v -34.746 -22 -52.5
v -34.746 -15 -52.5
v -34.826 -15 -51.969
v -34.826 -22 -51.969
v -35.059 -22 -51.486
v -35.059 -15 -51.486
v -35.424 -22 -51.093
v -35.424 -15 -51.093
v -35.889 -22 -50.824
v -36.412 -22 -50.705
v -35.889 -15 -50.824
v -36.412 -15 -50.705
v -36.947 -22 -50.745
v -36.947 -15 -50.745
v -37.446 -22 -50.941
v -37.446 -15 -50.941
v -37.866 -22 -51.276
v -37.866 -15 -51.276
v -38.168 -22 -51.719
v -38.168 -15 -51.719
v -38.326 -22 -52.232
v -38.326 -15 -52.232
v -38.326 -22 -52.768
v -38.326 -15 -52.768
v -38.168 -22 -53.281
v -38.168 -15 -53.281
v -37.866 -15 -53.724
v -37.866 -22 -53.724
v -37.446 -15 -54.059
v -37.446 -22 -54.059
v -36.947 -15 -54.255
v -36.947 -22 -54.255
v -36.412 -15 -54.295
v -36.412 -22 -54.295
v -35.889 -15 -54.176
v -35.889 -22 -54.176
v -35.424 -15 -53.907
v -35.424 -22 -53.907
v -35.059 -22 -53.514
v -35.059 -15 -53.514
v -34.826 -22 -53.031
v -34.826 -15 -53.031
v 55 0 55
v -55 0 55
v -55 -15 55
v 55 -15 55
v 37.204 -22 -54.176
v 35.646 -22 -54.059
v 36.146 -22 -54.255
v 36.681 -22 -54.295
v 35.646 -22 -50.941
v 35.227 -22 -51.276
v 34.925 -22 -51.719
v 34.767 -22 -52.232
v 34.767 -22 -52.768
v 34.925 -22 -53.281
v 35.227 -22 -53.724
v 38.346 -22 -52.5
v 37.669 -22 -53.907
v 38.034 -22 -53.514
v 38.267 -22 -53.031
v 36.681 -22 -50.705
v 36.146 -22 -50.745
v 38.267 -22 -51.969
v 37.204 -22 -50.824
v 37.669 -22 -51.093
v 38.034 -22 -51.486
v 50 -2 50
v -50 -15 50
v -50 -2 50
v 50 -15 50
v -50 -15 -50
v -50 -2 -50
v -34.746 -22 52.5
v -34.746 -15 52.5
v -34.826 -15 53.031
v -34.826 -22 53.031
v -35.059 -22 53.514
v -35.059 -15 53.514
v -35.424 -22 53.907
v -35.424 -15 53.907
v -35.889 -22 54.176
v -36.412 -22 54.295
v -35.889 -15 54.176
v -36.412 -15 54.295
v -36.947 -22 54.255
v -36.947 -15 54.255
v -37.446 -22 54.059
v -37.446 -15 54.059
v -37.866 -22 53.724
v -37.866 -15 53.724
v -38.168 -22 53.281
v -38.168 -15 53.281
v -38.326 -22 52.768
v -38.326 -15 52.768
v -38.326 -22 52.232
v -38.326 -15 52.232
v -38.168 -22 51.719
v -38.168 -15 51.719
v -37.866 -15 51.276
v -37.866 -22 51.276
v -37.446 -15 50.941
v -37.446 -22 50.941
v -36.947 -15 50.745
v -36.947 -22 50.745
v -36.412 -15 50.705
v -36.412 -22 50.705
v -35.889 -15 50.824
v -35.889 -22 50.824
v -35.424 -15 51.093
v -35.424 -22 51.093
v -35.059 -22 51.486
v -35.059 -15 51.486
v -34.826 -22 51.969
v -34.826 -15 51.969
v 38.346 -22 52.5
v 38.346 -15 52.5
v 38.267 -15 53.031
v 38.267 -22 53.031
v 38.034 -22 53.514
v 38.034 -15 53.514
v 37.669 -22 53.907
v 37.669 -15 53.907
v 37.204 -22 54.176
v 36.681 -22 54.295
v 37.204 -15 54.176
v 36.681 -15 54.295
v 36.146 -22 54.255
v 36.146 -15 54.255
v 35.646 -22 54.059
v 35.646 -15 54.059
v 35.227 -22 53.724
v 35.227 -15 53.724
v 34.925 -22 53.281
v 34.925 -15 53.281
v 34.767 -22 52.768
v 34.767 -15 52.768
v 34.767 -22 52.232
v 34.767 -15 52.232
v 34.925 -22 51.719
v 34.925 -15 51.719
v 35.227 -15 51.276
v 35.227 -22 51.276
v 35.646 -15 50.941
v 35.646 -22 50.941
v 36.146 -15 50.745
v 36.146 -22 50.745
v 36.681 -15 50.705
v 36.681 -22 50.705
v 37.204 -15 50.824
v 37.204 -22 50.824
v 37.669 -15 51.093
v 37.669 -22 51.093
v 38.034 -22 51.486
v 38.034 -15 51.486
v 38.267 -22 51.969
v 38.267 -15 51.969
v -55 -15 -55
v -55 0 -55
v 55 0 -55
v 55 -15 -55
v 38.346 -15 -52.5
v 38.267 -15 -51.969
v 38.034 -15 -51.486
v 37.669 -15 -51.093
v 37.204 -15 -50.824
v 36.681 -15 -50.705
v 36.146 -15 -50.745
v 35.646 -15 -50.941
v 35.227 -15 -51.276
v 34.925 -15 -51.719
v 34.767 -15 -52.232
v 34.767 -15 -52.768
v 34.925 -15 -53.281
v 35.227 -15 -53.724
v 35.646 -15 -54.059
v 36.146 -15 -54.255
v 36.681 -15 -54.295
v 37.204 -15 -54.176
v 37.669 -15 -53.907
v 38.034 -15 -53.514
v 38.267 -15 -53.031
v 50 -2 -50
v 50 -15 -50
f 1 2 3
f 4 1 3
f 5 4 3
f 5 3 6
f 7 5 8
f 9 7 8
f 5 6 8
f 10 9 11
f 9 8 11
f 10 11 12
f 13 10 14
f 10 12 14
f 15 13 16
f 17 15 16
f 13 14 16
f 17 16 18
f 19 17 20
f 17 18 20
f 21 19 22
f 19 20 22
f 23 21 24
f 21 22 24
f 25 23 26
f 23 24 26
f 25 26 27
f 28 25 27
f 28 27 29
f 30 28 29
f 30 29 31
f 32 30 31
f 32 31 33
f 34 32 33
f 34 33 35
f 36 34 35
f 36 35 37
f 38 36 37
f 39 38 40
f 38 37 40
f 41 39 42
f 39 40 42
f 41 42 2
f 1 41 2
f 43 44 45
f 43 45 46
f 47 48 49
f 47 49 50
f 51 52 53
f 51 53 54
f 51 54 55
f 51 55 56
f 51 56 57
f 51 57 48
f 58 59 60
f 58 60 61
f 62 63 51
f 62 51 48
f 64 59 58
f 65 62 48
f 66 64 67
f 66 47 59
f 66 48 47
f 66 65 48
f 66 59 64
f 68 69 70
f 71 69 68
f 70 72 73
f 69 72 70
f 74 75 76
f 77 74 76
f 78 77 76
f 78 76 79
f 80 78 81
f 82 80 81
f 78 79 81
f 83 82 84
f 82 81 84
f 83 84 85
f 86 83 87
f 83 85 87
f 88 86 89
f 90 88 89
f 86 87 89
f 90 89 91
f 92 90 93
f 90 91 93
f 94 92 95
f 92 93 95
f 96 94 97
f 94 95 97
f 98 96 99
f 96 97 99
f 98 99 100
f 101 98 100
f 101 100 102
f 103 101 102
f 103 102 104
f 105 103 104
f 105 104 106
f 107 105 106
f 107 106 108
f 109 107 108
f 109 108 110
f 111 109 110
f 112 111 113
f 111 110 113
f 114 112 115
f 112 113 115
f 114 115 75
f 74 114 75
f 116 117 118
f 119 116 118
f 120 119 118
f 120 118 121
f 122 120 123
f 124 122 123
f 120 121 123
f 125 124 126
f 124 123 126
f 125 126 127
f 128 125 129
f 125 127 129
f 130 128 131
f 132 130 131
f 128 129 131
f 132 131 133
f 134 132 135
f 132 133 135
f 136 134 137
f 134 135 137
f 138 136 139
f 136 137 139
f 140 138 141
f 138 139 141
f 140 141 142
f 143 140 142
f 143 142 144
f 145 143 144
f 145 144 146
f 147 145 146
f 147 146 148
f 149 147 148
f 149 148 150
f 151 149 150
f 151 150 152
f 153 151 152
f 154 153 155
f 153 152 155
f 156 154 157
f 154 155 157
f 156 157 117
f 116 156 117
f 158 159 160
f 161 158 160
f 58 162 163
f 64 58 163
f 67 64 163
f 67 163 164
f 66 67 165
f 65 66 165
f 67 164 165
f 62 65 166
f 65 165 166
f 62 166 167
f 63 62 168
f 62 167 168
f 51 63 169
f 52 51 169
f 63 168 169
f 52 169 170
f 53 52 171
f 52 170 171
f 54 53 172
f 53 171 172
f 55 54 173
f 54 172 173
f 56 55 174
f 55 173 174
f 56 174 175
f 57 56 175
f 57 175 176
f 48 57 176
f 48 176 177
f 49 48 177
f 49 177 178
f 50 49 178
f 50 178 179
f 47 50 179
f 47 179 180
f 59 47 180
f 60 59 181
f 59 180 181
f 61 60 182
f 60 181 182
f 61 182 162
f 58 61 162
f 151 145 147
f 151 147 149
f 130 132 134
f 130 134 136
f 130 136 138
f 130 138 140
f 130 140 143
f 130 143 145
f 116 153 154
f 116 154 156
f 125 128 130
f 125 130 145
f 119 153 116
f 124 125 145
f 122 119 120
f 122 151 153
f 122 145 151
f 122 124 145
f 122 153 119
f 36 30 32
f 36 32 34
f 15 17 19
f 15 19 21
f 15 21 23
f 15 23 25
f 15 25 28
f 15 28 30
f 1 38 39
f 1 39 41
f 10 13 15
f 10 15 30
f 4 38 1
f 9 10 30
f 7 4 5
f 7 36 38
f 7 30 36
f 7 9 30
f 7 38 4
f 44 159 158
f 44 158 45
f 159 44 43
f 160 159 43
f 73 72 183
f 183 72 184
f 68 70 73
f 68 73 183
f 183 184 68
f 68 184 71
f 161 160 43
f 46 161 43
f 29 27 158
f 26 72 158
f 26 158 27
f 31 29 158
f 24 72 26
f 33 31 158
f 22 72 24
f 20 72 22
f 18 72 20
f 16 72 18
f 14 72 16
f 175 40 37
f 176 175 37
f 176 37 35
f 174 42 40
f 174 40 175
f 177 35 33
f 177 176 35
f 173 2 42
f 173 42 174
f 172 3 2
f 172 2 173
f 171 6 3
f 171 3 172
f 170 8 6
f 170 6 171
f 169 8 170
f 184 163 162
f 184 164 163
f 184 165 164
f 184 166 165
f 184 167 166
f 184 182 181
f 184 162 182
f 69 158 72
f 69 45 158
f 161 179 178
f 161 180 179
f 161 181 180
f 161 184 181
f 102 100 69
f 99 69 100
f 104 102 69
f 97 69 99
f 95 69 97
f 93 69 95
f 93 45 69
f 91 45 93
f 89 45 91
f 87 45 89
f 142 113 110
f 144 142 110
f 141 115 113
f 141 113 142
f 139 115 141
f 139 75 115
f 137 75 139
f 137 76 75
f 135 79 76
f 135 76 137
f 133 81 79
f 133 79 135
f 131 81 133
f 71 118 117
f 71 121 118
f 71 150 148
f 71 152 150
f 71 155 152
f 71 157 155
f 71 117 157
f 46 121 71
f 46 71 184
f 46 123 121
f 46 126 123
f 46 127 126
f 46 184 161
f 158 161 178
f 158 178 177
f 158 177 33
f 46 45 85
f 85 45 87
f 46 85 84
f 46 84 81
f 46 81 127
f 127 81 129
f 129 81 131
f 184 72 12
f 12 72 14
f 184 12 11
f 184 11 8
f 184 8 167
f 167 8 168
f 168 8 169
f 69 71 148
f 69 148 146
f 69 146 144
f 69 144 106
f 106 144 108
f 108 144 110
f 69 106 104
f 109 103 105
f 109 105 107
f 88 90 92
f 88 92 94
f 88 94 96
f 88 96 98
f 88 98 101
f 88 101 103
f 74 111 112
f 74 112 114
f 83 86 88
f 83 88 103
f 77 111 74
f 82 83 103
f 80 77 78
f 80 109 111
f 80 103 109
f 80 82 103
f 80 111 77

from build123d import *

# Parameters (mm, degrees)
F0_W     = 110
F0_H     = 110
F1_DEPTH = 15
F2_W     = 100
F2_H     = 100
F3_DEPTH = 13
F4_R     = 1.8
F5_DEPTH = 7


with BuildPart() as f1:
    # F0 (on Front) → F1 (new body)
    with BuildSketch(Plane.XZ):
        Rectangle(F0_W, F0_H)
    extrude(amount=F1_DEPTH)

    # F2 (on face) → F3 (cut)
    with BuildSketch(Plane.XZ.offset(15)):
        Rectangle(F2_W, F2_H)
    extrude(amount=-F3_DEPTH, mode=Mode.SUBTRACT)

    # F4 (on face) → F5 (join)
    with BuildSketch(Plane.XZ.offset(15)):
        with Locations((-36.54647, 52.5)):
            Circle(F4_R)
        with Locations((36.54647, 52.5)):
            Circle(F4_R)
        with Locations((-36.54647, -52.5)):
            Circle(F4_R)
        with Locations((36.54647, -52.5)):
            Circle(F4_R)
    extrude(amount=F5_DEPTH)


solid = f1.part
